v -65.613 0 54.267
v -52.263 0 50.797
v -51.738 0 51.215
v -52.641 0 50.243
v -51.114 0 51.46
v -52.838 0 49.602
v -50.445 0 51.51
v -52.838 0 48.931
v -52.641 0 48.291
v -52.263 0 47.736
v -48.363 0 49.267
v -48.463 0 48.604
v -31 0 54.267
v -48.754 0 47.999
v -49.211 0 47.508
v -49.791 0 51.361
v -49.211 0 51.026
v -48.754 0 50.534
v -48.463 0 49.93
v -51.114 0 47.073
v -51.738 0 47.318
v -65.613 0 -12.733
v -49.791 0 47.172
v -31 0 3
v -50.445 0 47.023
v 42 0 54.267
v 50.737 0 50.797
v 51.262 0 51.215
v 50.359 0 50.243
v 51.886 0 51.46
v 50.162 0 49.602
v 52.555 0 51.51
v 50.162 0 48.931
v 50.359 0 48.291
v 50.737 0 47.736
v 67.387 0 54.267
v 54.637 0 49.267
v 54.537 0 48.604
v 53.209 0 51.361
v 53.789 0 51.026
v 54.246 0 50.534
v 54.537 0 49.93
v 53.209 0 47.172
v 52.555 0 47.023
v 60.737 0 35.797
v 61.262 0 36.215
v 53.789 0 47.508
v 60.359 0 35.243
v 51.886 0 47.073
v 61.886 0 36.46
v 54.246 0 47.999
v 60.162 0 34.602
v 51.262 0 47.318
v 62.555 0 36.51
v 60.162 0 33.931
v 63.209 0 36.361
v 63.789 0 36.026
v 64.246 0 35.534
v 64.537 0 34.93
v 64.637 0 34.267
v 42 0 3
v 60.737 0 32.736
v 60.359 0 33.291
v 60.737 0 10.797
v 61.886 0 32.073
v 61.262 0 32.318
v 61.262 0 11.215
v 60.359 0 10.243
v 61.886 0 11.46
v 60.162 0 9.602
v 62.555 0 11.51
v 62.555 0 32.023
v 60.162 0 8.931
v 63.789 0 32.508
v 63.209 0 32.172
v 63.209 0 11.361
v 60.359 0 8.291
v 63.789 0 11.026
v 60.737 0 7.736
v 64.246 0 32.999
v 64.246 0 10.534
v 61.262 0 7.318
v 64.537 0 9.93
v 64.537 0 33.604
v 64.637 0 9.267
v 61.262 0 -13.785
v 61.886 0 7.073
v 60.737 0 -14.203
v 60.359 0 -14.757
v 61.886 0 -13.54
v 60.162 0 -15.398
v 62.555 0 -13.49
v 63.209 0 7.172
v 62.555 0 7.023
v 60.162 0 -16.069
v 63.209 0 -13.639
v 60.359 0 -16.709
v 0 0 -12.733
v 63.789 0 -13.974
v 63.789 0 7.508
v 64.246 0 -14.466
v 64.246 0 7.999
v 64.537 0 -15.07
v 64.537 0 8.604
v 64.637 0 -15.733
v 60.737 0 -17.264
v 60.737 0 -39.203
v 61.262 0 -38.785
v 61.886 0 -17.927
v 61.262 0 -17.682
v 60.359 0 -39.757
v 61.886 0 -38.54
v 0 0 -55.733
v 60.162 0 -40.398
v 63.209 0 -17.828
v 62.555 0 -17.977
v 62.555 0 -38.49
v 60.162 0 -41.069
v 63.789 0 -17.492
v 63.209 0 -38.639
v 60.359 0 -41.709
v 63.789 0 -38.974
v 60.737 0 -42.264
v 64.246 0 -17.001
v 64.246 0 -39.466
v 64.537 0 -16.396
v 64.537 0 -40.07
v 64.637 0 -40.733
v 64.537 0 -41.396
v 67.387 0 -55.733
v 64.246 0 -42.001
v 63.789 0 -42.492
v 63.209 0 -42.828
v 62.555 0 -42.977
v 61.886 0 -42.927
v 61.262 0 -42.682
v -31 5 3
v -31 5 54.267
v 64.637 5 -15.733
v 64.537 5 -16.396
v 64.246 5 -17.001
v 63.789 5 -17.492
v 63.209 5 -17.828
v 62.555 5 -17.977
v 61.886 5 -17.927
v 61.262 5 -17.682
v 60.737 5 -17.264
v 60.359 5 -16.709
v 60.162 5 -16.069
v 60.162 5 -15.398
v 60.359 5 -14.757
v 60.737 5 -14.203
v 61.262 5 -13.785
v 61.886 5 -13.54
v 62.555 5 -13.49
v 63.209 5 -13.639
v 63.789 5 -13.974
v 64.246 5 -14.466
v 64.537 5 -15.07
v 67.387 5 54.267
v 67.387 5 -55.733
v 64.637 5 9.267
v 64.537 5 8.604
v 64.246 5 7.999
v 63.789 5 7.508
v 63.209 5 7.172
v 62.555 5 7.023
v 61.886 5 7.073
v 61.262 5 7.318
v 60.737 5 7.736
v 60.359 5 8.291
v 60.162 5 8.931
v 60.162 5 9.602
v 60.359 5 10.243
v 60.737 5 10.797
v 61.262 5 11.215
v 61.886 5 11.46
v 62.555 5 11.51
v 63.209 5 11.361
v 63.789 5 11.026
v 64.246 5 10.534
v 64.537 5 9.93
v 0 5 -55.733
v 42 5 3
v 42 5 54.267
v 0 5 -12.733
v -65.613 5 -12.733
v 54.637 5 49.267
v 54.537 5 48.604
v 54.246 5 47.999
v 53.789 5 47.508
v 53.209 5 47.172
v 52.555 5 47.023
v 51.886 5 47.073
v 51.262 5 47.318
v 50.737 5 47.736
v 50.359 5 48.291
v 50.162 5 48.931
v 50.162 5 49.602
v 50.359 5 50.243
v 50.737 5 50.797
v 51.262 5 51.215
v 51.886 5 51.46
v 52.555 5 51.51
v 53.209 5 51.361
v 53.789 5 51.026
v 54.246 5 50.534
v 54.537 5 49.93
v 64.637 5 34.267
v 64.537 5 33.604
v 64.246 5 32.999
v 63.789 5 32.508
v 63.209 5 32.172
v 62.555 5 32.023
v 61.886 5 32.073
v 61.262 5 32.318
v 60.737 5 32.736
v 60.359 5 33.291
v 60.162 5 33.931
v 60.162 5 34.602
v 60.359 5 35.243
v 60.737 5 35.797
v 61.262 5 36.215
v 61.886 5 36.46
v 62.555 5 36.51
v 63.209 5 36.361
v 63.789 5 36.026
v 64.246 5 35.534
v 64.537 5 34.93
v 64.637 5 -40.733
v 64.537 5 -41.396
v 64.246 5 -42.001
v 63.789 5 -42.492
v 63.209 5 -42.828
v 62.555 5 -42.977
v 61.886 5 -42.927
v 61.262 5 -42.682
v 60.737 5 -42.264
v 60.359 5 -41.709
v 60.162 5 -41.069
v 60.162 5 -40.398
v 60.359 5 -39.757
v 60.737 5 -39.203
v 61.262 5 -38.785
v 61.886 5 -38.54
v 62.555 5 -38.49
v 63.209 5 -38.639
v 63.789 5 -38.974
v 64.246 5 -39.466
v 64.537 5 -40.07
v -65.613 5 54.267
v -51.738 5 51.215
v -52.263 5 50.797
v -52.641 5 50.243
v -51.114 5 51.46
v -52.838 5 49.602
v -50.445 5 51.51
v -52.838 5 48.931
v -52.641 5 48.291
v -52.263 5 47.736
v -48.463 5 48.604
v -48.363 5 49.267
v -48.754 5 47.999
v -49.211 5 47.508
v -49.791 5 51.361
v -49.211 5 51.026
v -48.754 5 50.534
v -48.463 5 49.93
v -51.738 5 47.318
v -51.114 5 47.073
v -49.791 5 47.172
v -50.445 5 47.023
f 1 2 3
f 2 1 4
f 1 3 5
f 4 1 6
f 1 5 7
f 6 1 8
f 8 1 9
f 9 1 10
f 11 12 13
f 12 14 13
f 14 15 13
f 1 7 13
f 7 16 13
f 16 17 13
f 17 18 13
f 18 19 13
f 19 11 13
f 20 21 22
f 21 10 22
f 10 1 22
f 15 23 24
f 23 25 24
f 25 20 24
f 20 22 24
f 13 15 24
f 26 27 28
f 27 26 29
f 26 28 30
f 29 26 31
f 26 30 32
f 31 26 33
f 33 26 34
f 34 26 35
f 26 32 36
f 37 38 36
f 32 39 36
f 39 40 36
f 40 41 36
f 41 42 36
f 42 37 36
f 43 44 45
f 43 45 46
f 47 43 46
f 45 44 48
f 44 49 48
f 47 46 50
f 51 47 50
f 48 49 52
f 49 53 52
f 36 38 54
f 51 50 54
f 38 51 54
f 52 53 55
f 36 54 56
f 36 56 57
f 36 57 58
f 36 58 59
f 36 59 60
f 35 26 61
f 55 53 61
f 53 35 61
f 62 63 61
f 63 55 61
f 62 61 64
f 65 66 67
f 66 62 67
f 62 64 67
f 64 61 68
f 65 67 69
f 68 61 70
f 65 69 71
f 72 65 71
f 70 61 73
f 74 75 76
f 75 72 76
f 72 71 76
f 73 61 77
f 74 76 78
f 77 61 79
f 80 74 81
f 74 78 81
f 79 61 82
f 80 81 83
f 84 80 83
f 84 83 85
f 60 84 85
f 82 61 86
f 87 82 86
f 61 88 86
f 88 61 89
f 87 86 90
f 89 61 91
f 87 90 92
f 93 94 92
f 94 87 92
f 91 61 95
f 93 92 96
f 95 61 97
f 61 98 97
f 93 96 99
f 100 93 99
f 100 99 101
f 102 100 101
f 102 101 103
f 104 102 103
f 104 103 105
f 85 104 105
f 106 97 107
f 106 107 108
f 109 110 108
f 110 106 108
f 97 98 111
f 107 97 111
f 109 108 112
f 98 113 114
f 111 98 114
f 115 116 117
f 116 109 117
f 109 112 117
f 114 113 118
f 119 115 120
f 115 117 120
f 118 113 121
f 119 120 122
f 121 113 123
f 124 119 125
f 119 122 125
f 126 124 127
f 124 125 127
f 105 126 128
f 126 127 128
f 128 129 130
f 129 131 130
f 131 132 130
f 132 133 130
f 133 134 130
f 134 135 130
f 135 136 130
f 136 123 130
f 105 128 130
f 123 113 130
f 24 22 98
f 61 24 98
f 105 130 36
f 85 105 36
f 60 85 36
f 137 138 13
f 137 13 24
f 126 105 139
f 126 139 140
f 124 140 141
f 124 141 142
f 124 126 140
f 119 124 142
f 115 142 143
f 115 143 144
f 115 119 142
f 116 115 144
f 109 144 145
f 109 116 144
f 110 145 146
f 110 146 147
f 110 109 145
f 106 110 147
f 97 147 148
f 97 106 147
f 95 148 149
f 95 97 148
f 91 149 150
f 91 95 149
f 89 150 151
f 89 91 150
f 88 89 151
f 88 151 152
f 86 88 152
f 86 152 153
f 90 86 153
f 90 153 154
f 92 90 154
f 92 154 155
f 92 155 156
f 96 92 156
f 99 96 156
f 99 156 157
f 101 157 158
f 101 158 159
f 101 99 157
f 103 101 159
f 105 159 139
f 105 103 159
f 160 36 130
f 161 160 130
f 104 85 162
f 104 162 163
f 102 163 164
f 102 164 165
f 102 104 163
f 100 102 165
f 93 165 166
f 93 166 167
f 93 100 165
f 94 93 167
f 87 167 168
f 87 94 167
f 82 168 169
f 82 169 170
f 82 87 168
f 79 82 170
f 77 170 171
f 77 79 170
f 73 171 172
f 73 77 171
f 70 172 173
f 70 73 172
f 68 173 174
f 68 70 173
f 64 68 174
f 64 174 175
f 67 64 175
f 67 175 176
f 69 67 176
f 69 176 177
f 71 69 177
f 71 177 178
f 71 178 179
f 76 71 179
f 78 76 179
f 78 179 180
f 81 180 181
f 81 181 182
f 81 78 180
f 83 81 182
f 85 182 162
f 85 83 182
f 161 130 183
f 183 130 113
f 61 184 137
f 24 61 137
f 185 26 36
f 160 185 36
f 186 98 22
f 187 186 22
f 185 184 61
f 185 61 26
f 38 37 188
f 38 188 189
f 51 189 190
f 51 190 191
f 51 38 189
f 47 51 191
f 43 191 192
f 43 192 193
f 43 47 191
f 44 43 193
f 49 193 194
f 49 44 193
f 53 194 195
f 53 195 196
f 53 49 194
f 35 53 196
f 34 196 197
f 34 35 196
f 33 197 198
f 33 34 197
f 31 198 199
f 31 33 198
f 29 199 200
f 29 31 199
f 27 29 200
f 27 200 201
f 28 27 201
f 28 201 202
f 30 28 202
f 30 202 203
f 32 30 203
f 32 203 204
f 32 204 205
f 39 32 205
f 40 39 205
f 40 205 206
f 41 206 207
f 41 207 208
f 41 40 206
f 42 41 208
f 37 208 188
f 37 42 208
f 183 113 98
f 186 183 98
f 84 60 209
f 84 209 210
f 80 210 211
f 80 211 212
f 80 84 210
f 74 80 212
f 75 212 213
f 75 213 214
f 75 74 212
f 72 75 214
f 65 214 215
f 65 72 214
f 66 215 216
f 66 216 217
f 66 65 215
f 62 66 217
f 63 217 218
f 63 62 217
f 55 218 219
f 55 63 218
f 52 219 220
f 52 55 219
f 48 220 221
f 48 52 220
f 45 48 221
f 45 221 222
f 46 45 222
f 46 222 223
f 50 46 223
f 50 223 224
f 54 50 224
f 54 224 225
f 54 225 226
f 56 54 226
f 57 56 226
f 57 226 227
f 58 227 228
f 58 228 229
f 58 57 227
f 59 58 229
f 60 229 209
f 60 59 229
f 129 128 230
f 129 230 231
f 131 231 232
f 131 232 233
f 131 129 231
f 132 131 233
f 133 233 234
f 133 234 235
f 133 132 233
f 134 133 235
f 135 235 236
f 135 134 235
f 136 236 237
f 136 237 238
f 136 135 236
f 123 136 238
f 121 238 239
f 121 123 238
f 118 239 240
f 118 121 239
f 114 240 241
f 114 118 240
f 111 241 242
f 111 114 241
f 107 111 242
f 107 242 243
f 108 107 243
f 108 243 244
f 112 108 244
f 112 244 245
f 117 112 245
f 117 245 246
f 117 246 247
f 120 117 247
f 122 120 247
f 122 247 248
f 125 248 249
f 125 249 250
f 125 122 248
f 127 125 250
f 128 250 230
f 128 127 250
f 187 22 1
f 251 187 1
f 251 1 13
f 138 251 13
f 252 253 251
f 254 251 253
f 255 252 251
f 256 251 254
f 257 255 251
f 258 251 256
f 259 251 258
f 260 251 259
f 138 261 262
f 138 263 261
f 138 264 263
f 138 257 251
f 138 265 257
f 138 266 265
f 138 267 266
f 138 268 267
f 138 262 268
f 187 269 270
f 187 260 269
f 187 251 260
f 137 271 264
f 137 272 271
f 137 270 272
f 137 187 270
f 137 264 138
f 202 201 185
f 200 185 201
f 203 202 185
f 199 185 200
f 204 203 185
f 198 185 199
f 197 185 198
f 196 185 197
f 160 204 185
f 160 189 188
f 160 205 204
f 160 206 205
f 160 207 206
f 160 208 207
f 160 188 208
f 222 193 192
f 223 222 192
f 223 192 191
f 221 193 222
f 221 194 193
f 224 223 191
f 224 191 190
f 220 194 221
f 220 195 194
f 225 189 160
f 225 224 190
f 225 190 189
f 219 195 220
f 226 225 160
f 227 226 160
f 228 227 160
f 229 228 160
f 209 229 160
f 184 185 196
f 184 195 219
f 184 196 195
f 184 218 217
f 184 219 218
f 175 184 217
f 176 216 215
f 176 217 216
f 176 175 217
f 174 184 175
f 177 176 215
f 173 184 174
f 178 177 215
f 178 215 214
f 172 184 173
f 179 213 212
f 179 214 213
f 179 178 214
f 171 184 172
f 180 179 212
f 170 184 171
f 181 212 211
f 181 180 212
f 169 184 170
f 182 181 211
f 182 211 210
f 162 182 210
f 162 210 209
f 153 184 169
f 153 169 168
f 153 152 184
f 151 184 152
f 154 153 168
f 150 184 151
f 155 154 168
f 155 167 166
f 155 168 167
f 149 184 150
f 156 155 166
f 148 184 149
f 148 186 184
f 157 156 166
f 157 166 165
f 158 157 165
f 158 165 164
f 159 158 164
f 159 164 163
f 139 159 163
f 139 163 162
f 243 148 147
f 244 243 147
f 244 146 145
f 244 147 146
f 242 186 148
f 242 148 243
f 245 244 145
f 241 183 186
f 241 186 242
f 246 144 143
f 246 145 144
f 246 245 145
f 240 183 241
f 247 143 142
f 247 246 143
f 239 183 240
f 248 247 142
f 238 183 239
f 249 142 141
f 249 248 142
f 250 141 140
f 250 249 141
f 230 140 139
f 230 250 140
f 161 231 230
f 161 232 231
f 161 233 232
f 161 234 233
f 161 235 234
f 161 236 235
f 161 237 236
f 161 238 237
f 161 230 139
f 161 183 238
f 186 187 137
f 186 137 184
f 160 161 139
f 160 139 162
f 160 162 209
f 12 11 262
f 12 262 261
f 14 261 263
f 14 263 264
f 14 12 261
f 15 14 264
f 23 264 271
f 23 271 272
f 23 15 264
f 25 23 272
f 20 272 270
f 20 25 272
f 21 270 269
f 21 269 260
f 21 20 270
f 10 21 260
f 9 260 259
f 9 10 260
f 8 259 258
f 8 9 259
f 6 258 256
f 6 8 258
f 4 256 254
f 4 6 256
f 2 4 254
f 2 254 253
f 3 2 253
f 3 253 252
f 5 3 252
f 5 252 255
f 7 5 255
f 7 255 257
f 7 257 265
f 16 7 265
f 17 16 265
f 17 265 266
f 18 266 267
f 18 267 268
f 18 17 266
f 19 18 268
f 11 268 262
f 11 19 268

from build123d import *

# Parameters (mm, degrees)
SKETCH1_R           = 2.25
BOSS_EXTRUDE1_DEPTH = 5
CUT_EXTRUDE1_DEPTH  = 5


with BuildPart() as part:
    # Sketch1 → Boss-Extrude1 (new body)
    with BuildSketch(Plane(origin=(0, 0, 0), x_dir=(1, 0, 0), z_dir=(0, 1, 0))):
        Polygon((0, 55.733260811), (0, 12.733260811), (-65.613421019, 12.733260811), (-65.613421019, -54.266739189), (67.386578981, -54.266739189), (67.386578981, 55.733260811), align=None)
        with Locations((62.386578981, 40.733260811)):
            Circle(SKETCH1_R, mode=Mode.SUBTRACT)
        with Locations((62.386578981, 15.733260811)):
            Circle(SKETCH1_R, mode=Mode.SUBTRACT)
        with Locations((62.386578981, -9.266739189)):
            Circle(SKETCH1_R, mode=Mode.SUBTRACT)
        with Locations((62.386578981, -34.266739189)):
            Circle(SKETCH1_R, mode=Mode.SUBTRACT)
        with Locations((0.886578981, -49.266739189)):
            Circle(SKETCH1_R, mode=Mode.SUBTRACT)
        with Locations((-50.613421019, -49.266739189)):
            Circle(SKETCH1_R, mode=Mode.SUBTRACT)
        with Locations((52.386578981, -49.266739189)):
            Circle(SKETCH1_R, mode=Mode.SUBTRACT)
    extrude(amount=BOSS_EXTRUDE1_DEPTH)

    # Sketch2 → Cut-Extrude1 (cut)
    with BuildSketch(Plane(origin=(0, 5, 0), x_dir=(1, 0, 0), z_dir=(0, 1, 0))):
        Polygon((-8, -3), (42, -3), (42, -54.266739189), (-8, -54.266739189), (-31, -54.266739189), (-31, -3), align=None)
    extrude(amount=-CUT_EXTRUDE1_DEPTH, mode=Mode.SUBTRACT)


solid = part.part
